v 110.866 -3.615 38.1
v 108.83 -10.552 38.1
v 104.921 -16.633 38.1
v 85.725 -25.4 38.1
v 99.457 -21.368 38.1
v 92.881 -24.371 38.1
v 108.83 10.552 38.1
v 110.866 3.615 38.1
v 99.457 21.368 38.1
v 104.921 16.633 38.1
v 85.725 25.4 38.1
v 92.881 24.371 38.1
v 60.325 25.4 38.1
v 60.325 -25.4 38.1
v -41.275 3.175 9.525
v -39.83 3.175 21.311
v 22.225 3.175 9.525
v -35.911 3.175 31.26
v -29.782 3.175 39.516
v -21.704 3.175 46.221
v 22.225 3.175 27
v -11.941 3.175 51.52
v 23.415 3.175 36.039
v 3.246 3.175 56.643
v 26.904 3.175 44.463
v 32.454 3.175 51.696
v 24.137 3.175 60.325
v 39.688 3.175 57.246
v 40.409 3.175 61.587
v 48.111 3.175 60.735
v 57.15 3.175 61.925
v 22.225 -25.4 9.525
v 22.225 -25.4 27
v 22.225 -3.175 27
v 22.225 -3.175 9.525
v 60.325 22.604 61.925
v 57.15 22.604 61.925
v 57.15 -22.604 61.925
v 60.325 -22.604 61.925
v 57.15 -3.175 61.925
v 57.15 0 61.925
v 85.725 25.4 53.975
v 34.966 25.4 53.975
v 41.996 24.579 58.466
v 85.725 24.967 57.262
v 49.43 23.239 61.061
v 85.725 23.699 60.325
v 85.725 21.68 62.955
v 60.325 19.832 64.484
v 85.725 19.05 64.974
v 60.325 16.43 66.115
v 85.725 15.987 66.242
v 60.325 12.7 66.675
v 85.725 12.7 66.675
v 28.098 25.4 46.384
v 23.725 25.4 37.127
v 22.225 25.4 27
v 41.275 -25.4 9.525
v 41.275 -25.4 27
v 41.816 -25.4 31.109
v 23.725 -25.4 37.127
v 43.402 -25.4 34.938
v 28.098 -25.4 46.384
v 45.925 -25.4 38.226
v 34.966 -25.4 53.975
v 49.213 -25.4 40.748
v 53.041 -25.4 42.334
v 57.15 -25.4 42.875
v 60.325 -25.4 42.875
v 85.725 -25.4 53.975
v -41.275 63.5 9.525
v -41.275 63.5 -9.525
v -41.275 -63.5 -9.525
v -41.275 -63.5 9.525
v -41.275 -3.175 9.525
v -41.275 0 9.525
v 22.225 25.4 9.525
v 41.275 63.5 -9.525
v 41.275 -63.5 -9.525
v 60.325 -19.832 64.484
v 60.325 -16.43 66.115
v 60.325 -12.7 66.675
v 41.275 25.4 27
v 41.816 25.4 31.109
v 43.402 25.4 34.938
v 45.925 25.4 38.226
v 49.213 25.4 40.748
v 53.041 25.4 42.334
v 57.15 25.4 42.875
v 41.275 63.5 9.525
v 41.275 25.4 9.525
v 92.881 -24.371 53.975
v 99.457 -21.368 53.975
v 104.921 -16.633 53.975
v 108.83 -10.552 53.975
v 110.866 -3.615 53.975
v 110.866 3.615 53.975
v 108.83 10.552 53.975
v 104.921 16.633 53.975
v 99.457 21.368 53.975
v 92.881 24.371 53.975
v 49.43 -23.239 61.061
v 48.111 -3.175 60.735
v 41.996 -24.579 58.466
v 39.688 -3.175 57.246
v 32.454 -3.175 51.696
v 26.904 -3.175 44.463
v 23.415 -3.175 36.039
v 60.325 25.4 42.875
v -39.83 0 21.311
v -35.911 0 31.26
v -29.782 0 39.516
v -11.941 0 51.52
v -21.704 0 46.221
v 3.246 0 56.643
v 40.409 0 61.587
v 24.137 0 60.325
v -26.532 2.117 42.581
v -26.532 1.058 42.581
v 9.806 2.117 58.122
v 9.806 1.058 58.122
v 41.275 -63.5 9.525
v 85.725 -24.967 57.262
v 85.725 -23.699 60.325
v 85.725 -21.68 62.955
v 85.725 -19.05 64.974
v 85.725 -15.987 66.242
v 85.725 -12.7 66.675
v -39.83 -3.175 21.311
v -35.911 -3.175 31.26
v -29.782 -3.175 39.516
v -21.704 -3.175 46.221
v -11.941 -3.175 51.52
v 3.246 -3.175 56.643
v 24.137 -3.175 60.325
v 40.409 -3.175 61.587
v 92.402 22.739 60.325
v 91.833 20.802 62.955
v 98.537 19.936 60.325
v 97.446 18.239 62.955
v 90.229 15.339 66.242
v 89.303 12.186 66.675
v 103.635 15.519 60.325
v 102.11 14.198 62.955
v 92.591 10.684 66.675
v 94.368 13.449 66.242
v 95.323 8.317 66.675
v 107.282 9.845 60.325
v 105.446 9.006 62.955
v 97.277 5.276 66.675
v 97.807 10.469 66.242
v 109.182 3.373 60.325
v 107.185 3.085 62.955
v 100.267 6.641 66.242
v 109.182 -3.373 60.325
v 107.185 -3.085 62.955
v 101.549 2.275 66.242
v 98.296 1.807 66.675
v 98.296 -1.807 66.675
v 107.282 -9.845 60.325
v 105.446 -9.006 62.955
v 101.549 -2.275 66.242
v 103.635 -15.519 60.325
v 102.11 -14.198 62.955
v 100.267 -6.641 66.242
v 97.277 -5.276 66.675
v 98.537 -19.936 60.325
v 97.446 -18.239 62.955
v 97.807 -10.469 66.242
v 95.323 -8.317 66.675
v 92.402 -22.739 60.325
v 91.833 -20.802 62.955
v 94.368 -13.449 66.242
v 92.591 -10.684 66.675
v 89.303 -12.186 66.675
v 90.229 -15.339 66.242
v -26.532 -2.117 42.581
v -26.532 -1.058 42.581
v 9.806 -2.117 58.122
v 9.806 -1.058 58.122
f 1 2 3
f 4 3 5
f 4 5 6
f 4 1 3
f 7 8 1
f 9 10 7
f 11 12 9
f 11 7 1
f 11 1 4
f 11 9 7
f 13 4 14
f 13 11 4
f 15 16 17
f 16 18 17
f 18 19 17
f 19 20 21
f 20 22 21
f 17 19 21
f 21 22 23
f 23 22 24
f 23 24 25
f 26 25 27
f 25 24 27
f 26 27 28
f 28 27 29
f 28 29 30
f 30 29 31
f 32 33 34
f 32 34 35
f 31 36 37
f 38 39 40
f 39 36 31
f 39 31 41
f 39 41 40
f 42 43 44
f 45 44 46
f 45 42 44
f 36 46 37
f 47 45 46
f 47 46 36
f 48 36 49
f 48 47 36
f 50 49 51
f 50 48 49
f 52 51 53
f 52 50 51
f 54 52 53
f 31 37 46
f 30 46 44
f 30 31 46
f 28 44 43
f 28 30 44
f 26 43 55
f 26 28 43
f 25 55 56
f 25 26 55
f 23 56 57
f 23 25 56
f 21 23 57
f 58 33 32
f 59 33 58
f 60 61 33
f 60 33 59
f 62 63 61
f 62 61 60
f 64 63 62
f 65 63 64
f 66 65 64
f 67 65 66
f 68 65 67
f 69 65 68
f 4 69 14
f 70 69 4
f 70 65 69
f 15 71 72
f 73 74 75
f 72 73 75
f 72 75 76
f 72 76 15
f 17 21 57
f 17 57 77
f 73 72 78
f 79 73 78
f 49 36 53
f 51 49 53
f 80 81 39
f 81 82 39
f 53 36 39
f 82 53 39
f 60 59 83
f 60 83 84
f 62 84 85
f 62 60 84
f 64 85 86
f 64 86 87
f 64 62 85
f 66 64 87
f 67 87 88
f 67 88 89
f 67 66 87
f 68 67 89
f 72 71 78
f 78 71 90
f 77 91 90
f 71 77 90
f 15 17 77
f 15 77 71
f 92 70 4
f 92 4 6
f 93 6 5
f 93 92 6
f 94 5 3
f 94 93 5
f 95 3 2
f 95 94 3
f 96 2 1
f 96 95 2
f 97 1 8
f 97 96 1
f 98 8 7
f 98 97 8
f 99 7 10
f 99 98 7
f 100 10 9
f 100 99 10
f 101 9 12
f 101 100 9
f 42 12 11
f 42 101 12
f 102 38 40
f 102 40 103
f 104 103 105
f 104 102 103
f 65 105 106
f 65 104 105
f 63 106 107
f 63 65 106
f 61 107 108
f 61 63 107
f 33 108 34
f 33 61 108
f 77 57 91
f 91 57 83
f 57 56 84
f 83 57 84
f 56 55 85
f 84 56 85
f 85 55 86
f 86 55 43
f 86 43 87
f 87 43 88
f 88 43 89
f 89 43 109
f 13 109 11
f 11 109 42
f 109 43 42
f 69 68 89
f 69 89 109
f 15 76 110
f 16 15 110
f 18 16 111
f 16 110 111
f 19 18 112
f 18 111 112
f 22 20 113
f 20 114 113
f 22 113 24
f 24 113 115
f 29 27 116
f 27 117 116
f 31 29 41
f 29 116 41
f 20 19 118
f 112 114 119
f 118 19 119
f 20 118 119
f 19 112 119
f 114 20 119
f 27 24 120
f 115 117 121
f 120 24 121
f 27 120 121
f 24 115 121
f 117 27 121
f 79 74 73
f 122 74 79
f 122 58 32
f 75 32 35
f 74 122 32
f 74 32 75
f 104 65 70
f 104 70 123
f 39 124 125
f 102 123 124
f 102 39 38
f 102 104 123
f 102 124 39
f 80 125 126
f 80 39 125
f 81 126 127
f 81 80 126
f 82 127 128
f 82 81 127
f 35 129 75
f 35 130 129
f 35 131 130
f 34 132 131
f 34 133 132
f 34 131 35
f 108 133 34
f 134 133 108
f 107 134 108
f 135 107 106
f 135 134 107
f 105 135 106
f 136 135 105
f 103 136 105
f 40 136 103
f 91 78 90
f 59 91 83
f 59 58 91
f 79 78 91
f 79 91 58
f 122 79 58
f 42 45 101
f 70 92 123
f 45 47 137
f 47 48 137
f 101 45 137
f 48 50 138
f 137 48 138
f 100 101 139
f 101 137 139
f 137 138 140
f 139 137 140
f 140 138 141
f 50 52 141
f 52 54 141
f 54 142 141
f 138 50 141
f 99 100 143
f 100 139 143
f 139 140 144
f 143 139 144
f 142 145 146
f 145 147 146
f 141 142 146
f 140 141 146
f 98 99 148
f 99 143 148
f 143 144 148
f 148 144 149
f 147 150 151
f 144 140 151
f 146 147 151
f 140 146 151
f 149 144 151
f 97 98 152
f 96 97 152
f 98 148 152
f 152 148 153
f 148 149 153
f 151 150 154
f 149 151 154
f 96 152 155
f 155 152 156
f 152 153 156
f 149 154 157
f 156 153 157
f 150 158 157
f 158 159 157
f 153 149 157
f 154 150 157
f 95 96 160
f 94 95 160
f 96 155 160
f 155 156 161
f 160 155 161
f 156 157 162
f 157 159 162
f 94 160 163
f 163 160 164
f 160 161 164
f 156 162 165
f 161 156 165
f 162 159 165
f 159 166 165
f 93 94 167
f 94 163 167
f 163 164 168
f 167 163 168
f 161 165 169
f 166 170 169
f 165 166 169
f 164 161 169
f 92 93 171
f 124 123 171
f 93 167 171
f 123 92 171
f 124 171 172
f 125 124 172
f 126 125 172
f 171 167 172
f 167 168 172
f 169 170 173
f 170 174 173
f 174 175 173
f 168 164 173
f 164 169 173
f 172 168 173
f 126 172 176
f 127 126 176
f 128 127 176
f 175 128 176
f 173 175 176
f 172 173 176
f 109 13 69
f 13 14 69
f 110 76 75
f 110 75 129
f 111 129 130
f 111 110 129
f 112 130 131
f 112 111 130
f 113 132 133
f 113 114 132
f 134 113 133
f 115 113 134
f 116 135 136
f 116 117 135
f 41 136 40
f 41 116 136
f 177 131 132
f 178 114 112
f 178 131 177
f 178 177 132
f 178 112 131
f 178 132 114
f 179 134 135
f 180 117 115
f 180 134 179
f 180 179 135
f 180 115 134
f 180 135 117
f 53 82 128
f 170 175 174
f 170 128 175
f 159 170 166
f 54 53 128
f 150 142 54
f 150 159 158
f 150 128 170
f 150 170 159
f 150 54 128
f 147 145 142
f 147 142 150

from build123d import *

# Parameters (mm, degrees)
F1_DEPTH = 63.5
F0_W     = 25.4
F0_H     = 4.7752
F0_H_2   = 19.05
F0_H_3   = 4.7498
F2_DEPTH = 25.4
F4_DEPTH = 3.175
F5_R     = 12.7


with BuildPart() as f1:
    # F0 (on Front) → F1 (new body, symmetric)
    with BuildSketch(Plane.XZ):
        Polygon((41.275, -9.525), (41.275, 9.525), (22.225, 9.525), (-41.275, 9.525), (-41.275, -9.525), align=None)
    extrude(amount=F1_DEPTH, both=True)

    # F0 (on Front) → F2 (join, symmetric)
    with BuildSketch(Plane.XZ):
        with BuildLine():
            Line((22.225, 9.525), (41.275, 9.525))
            Line((41.275, 9.525), (41.275, 27.0002))
            ThreePointArc((41.275, 27.0002), (45.9246798487, 38.2255201513), (57.15, 42.8752))
            Line((57.15, 42.8752), (60.325, 42.8752))
            Line((60.325, 42.8752), (60.325, 61.9252))
            Line((60.325, 61.9252), (57.15, 61.9252))
            ThreePointArc((57.15, 61.9252), (32.4542956671, 51.6959043329), (22.225, 27.0002))
            Line((22.225, 27.0002), (22.225, 9.525))
        make_face()
        with Locations((73.025, 40.4876)):
            Rectangle(F0_W, F0_H)
        with Locations((73.025, 52.4002)):
            Rectangle(F0_W, F0_H_2)
        with Locations((73.025, 64.3001)):
            Rectangle(F0_W, F0_H_3)
    extrude(amount=F2_DEPTH, both=True)

    # F0 (on Front) → F3 (revolve)
    with BuildSketch(Plane.XZ):
        Polygon((85.725, 61.9252), (85.725, 42.8752), (85.725, 38.1), (111.125, 38.1), (111.125, 66.675), (85.725, 66.675), align=None)
    revolve(axis=Axis((85.725, 0, 52.3875), (0, 0, 1)))

    # F0 (on Front) → F4 (join, symmetric)
    with BuildSketch(Plane.XZ):
        with BuildLine():
            Line((-41.275, 9.525), (22.225, 9.525))
            Line((22.225, 9.525), (22.225, 27.0002))
            ThreePointArc((22.225, 27.0002), (32.4542956671, 51.6959043329), (57.15, 61.9252))
            add(Edge.make_bspline(
                [(-41.275, 9.525), (-40.8581793308, 53.2651096582), (7.8326556832, 62.0646551251), (57.15, 61.9252)],
                knots=[0, 0, 0, 0, 111.5045361635, 111.5045361635, 111.5045361635, 111.5045361635], degree=3))
        make_face()
    extrude(amount=F4_DEPTH, both=True)

    # F5
    f5_edges = [f1.edges().sort_by_distance(p)[0] for p in [
        (85.725, 25.4, 52.3875),
        (73.025, 25.4, 66.675),
        (73.025, -25.4, 66.675),
        (111.125, 0, 66.675),
    ]]
    fillet(f5_edges, radius=F5_R)


solid = f1.part
